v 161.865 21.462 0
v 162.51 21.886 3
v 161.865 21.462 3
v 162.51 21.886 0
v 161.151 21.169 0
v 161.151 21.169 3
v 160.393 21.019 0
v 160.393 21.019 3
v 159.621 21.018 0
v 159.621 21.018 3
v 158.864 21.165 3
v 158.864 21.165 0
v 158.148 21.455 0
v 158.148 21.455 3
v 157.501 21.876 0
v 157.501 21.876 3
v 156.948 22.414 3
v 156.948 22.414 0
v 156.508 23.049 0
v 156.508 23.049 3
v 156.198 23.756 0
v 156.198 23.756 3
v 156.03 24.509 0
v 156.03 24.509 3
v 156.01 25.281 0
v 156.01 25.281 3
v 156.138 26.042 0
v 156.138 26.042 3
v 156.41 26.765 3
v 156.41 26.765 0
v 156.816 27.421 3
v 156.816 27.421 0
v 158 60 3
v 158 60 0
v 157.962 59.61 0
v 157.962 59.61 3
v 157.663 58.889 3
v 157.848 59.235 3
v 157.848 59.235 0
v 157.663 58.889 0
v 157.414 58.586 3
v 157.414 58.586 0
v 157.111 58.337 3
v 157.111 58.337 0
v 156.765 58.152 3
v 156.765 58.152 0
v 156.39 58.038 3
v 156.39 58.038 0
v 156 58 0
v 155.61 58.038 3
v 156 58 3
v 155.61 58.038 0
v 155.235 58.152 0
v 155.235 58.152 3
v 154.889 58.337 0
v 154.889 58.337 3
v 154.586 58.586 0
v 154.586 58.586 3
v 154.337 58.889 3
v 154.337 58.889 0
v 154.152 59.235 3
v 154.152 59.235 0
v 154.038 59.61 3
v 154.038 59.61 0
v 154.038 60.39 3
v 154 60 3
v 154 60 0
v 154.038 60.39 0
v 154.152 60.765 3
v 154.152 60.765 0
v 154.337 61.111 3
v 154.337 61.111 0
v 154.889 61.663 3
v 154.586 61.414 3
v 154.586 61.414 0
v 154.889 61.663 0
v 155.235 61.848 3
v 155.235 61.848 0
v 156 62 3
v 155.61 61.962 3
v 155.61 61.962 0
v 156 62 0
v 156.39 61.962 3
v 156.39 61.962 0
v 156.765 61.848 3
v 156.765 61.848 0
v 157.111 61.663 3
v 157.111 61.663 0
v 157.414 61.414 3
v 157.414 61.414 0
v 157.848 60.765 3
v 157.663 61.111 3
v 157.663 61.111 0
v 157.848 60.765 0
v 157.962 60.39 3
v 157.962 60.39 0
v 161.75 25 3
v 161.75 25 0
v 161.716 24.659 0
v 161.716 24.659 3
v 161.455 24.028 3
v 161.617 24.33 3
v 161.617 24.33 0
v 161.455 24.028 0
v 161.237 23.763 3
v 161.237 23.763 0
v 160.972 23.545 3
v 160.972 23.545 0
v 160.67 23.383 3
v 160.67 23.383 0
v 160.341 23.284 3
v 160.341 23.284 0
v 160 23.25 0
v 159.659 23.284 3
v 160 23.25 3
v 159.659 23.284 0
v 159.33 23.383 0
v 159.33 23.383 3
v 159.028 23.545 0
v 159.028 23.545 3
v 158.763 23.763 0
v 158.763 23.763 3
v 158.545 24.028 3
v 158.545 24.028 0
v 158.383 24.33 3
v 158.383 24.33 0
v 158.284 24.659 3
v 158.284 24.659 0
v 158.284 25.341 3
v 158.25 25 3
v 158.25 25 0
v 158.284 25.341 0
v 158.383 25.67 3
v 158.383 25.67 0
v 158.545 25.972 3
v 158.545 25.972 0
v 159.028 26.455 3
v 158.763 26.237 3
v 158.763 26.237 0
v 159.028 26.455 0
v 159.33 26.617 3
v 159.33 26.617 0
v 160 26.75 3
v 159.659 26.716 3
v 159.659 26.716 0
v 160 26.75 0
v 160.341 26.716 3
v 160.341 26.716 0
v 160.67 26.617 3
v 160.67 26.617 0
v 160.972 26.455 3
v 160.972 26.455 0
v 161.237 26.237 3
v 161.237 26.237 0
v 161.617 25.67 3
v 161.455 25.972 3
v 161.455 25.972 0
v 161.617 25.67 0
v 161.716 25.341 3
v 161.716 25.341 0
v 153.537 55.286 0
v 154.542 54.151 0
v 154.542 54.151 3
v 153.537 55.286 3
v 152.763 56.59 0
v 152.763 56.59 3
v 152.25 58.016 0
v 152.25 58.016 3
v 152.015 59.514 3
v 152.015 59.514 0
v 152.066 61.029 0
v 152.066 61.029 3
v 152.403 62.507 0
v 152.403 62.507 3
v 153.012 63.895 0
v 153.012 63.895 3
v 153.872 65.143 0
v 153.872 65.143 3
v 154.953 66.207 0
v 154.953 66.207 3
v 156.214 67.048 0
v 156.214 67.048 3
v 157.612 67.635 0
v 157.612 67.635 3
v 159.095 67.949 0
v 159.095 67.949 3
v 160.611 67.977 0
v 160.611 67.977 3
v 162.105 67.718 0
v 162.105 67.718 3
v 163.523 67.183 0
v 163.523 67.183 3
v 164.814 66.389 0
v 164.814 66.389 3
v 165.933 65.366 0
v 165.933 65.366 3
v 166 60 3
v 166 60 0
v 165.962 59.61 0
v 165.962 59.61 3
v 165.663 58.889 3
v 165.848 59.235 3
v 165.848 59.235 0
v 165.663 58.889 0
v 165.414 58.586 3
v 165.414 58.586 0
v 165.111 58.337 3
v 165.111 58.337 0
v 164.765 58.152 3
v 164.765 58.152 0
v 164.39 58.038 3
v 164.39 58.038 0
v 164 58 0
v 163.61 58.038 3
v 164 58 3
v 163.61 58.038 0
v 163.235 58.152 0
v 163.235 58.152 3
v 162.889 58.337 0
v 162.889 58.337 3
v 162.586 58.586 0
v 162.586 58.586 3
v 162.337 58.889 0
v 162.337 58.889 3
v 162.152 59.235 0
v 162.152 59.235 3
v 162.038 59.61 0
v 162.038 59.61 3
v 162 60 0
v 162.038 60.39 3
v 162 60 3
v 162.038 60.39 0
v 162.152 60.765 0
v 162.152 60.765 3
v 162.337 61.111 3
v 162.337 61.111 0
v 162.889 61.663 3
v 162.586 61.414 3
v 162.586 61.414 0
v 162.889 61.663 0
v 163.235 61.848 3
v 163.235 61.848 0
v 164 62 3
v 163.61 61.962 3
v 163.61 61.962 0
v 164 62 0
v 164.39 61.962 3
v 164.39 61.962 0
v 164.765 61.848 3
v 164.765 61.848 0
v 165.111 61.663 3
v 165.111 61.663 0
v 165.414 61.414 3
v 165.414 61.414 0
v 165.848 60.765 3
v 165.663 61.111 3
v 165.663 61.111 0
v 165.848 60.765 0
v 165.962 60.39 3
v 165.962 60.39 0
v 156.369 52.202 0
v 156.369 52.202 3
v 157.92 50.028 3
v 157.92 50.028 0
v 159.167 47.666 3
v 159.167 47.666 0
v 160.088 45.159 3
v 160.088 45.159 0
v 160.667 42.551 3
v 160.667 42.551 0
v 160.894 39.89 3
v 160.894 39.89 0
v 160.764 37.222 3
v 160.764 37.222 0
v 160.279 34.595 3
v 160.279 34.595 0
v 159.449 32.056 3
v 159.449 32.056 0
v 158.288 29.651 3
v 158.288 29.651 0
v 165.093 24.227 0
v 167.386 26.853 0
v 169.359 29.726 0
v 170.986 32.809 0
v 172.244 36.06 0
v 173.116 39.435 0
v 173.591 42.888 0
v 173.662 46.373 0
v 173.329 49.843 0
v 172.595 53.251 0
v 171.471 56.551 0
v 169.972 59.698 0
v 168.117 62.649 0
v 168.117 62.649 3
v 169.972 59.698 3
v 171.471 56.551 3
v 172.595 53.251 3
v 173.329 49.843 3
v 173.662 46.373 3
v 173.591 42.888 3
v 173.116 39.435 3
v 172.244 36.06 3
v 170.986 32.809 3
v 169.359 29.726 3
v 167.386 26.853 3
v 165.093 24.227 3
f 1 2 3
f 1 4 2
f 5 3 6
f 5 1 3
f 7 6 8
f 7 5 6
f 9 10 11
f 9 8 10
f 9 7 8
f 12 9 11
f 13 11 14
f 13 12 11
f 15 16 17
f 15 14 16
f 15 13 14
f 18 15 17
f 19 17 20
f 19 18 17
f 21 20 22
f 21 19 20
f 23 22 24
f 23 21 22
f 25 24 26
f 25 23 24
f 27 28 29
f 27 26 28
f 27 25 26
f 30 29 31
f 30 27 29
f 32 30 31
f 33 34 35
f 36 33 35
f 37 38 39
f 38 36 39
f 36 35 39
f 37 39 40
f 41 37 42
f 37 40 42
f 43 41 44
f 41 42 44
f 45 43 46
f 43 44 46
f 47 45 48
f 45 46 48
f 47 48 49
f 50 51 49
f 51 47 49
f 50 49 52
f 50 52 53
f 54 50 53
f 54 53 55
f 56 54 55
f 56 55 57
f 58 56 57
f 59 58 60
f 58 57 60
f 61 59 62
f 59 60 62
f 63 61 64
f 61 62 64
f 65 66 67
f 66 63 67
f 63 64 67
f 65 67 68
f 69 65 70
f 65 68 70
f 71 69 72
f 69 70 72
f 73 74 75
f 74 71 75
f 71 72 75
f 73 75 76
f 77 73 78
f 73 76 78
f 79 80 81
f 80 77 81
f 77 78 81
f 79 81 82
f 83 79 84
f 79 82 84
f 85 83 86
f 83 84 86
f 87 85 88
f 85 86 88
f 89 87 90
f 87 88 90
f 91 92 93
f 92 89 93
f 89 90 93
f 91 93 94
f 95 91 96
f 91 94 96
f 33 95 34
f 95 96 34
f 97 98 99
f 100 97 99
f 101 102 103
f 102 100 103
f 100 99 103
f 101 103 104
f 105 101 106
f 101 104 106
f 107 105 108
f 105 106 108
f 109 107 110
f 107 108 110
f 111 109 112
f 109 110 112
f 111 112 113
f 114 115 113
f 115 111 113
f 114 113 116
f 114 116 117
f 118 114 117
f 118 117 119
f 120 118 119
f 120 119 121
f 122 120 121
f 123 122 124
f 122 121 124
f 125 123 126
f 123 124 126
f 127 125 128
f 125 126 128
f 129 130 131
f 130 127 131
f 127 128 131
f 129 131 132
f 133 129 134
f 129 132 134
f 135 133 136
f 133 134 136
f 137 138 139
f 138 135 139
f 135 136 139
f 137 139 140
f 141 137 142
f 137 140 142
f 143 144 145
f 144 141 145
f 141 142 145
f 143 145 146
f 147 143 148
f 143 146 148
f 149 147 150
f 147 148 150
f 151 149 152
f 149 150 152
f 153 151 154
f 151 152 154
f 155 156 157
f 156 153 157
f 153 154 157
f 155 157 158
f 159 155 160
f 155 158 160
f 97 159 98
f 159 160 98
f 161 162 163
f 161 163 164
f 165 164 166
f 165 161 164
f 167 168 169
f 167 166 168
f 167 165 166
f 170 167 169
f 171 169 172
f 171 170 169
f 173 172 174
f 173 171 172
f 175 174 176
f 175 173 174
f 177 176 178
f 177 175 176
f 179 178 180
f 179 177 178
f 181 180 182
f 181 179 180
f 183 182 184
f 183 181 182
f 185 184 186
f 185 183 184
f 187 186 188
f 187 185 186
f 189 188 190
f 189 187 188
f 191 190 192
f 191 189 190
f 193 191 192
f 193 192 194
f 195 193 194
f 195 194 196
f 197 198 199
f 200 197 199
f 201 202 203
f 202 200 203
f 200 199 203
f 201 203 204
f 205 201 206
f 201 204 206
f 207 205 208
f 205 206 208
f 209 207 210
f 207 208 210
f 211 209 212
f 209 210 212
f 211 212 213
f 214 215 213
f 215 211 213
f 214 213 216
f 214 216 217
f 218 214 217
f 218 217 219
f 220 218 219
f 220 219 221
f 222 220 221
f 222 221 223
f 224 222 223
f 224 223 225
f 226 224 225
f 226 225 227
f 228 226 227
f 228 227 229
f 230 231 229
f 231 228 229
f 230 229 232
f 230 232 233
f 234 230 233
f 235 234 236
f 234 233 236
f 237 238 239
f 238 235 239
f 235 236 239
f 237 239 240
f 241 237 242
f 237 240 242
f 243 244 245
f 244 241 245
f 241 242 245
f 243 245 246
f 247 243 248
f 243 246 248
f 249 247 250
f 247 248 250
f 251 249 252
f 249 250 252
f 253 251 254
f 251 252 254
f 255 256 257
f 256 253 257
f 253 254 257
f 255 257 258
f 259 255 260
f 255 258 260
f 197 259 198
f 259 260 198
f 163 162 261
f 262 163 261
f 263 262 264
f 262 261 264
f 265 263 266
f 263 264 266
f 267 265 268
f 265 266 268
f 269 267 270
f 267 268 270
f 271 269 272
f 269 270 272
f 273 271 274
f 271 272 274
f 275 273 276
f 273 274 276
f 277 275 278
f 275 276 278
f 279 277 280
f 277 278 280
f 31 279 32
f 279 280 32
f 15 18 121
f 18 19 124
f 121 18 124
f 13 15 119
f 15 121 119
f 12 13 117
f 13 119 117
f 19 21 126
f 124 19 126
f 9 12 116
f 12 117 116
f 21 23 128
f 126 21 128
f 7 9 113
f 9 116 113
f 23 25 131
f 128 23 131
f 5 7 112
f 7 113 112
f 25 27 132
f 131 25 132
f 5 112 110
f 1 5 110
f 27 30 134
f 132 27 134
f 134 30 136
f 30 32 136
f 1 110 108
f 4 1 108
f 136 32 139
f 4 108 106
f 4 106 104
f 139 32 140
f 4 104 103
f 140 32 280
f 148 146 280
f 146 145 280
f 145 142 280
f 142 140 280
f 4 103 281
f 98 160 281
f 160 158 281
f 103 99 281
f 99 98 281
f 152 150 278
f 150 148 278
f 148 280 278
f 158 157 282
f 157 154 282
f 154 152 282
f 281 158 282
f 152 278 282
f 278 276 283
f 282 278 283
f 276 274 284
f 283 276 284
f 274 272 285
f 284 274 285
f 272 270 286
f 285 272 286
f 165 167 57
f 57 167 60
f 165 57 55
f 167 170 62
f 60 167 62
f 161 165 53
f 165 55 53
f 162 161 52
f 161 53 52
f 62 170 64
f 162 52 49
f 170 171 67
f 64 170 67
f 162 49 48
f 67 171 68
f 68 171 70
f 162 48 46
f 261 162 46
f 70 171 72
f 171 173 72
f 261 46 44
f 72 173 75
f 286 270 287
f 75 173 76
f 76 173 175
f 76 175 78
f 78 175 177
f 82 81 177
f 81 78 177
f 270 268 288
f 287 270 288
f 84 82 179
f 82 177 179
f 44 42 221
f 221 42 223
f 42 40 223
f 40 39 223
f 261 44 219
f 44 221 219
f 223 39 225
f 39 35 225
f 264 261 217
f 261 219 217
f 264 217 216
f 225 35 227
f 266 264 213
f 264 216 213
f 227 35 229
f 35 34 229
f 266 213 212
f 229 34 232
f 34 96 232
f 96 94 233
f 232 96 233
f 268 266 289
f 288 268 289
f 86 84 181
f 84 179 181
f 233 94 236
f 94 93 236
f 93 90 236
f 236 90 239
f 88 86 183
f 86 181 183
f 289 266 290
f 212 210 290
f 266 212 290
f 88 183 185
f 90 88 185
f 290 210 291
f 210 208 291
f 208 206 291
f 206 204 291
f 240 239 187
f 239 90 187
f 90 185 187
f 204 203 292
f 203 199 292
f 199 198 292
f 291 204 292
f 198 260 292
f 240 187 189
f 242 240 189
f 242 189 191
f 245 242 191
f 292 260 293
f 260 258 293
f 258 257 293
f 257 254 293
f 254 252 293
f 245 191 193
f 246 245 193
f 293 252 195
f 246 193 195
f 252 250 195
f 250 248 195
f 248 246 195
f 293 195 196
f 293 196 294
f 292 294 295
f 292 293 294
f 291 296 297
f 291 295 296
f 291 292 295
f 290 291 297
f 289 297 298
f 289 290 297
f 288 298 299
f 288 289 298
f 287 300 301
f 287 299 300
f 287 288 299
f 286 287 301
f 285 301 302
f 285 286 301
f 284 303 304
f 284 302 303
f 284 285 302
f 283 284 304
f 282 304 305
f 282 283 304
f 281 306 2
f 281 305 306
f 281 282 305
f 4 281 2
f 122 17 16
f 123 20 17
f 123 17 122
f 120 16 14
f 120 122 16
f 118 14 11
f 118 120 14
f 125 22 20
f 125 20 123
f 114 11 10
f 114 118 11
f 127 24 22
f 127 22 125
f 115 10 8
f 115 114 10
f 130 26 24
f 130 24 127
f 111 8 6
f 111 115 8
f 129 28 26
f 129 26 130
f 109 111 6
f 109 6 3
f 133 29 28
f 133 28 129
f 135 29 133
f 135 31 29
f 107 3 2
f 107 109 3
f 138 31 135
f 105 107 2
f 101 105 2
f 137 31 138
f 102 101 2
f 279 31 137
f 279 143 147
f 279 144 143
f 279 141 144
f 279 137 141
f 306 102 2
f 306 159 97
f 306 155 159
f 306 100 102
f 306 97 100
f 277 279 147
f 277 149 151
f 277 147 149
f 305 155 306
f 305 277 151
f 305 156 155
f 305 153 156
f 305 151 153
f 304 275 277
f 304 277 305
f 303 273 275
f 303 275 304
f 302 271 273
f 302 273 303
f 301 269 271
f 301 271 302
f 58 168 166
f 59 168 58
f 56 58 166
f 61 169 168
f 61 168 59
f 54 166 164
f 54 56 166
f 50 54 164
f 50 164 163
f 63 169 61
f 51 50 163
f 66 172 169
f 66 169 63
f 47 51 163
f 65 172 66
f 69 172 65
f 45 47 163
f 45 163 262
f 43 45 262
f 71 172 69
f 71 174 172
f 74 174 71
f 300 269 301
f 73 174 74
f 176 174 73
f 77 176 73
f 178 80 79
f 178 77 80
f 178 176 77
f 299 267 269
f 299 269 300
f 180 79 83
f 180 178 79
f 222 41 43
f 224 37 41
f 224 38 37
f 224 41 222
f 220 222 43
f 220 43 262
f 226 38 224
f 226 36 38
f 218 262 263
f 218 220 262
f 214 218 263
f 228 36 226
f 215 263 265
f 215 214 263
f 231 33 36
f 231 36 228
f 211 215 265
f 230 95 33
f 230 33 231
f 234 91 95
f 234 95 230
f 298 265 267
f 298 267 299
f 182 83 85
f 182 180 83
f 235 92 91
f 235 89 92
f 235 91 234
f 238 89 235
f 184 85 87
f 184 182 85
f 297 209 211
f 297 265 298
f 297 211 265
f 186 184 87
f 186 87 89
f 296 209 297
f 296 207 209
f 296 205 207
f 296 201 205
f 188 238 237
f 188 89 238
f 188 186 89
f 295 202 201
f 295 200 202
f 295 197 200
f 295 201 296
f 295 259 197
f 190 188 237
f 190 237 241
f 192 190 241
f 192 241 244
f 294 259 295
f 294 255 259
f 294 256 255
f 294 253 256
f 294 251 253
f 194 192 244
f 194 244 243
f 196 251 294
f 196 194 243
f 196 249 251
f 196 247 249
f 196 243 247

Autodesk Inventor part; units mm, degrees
ref_plane "YZ Plane" through (0, 0, 0) normal (1, 0, 0) x (0, 1, 0)
ref_plane "XZ Plane" through (0, 0, 0) normal (0, 1, 0) x (-1, 0, 0)
ref_plane "XY Plane" through (0, 0, 0) normal (0, 0, 1) x (1, 0, 0)
sketch "スケッチ1" plane through (0, 0, 0) normal (0, 0, 1) x (1, 0, 0)
  line L0 (160, 60) -> (160, 25) construction
  line L1 (160, 25) -> (154.8697, 39.0954) construction
  line L2 (154.8697, 39.0954) -> (174.0726, 33.5055) construction
  line L3 (174.0726, 33.5055) -> (160, 60) construction
  circle A0 centre (154.8697, 39.0954) radius 3 construction
  circle A1 centre (160, 60) radius 4 construction
  circle A2 centre (160, 60) radius 8
  line L4 (161.8764, 56.4674) -> (158.1236, 63.5326) construction
  circle A3 centre (164, 60) radius 4 construction
  circle A4 centre (156, 60) radius 4 construction
  circle A5 centre (164, 60) radius 3
  circle A6 centre (156, 60) radius 3
  line L5 (164, 60) -> (156, 60) construction
  circle A7 centre (160, 25) radius 4
  circle A8 centre (160, 25) radius 1.75
  arc A9 (162.5102, 21.8857) -> (165.9333, 65.3662) centre (143.6835, 45.2429) ccw
  arc A10 (156.8162, 27.4214) -> (154.542, 54.151) centre (140.8971, 39.5286) ccw
  circle A11 centre (156, 60) radius 2
  circle A12 centre (164, 60) radius 2
  point P0 (0, 0)
  point P1 (136.5819, 50.9264)
  point P2 (160, 60)
  dimension "d0" = 15
  dimension "d1" = 20
  dimension "d2" = 30
  dimension "d3" = 35
  dimension "d4" = 6
  dimension "d5" = 340
  dimension "d6" = 16
  dimension "d7" = 8
  dimension "d8" = 6
  dimension "d9" = 6
  dimension "d10" = 8
  dimension "d11" = 3.5
  dimension "d12" = 20
  dimension "d15" = 4
  dimension "d16" = 4
  dimension "d17" = 30
extrude "押し出し1" add sketch "スケッチ1" along normal blind 3 contours A2 | A2 A9 A7 A10 | A7 | A5 | A6
properties part number "原動節外側" material "アルミニウム 2014-T4"
